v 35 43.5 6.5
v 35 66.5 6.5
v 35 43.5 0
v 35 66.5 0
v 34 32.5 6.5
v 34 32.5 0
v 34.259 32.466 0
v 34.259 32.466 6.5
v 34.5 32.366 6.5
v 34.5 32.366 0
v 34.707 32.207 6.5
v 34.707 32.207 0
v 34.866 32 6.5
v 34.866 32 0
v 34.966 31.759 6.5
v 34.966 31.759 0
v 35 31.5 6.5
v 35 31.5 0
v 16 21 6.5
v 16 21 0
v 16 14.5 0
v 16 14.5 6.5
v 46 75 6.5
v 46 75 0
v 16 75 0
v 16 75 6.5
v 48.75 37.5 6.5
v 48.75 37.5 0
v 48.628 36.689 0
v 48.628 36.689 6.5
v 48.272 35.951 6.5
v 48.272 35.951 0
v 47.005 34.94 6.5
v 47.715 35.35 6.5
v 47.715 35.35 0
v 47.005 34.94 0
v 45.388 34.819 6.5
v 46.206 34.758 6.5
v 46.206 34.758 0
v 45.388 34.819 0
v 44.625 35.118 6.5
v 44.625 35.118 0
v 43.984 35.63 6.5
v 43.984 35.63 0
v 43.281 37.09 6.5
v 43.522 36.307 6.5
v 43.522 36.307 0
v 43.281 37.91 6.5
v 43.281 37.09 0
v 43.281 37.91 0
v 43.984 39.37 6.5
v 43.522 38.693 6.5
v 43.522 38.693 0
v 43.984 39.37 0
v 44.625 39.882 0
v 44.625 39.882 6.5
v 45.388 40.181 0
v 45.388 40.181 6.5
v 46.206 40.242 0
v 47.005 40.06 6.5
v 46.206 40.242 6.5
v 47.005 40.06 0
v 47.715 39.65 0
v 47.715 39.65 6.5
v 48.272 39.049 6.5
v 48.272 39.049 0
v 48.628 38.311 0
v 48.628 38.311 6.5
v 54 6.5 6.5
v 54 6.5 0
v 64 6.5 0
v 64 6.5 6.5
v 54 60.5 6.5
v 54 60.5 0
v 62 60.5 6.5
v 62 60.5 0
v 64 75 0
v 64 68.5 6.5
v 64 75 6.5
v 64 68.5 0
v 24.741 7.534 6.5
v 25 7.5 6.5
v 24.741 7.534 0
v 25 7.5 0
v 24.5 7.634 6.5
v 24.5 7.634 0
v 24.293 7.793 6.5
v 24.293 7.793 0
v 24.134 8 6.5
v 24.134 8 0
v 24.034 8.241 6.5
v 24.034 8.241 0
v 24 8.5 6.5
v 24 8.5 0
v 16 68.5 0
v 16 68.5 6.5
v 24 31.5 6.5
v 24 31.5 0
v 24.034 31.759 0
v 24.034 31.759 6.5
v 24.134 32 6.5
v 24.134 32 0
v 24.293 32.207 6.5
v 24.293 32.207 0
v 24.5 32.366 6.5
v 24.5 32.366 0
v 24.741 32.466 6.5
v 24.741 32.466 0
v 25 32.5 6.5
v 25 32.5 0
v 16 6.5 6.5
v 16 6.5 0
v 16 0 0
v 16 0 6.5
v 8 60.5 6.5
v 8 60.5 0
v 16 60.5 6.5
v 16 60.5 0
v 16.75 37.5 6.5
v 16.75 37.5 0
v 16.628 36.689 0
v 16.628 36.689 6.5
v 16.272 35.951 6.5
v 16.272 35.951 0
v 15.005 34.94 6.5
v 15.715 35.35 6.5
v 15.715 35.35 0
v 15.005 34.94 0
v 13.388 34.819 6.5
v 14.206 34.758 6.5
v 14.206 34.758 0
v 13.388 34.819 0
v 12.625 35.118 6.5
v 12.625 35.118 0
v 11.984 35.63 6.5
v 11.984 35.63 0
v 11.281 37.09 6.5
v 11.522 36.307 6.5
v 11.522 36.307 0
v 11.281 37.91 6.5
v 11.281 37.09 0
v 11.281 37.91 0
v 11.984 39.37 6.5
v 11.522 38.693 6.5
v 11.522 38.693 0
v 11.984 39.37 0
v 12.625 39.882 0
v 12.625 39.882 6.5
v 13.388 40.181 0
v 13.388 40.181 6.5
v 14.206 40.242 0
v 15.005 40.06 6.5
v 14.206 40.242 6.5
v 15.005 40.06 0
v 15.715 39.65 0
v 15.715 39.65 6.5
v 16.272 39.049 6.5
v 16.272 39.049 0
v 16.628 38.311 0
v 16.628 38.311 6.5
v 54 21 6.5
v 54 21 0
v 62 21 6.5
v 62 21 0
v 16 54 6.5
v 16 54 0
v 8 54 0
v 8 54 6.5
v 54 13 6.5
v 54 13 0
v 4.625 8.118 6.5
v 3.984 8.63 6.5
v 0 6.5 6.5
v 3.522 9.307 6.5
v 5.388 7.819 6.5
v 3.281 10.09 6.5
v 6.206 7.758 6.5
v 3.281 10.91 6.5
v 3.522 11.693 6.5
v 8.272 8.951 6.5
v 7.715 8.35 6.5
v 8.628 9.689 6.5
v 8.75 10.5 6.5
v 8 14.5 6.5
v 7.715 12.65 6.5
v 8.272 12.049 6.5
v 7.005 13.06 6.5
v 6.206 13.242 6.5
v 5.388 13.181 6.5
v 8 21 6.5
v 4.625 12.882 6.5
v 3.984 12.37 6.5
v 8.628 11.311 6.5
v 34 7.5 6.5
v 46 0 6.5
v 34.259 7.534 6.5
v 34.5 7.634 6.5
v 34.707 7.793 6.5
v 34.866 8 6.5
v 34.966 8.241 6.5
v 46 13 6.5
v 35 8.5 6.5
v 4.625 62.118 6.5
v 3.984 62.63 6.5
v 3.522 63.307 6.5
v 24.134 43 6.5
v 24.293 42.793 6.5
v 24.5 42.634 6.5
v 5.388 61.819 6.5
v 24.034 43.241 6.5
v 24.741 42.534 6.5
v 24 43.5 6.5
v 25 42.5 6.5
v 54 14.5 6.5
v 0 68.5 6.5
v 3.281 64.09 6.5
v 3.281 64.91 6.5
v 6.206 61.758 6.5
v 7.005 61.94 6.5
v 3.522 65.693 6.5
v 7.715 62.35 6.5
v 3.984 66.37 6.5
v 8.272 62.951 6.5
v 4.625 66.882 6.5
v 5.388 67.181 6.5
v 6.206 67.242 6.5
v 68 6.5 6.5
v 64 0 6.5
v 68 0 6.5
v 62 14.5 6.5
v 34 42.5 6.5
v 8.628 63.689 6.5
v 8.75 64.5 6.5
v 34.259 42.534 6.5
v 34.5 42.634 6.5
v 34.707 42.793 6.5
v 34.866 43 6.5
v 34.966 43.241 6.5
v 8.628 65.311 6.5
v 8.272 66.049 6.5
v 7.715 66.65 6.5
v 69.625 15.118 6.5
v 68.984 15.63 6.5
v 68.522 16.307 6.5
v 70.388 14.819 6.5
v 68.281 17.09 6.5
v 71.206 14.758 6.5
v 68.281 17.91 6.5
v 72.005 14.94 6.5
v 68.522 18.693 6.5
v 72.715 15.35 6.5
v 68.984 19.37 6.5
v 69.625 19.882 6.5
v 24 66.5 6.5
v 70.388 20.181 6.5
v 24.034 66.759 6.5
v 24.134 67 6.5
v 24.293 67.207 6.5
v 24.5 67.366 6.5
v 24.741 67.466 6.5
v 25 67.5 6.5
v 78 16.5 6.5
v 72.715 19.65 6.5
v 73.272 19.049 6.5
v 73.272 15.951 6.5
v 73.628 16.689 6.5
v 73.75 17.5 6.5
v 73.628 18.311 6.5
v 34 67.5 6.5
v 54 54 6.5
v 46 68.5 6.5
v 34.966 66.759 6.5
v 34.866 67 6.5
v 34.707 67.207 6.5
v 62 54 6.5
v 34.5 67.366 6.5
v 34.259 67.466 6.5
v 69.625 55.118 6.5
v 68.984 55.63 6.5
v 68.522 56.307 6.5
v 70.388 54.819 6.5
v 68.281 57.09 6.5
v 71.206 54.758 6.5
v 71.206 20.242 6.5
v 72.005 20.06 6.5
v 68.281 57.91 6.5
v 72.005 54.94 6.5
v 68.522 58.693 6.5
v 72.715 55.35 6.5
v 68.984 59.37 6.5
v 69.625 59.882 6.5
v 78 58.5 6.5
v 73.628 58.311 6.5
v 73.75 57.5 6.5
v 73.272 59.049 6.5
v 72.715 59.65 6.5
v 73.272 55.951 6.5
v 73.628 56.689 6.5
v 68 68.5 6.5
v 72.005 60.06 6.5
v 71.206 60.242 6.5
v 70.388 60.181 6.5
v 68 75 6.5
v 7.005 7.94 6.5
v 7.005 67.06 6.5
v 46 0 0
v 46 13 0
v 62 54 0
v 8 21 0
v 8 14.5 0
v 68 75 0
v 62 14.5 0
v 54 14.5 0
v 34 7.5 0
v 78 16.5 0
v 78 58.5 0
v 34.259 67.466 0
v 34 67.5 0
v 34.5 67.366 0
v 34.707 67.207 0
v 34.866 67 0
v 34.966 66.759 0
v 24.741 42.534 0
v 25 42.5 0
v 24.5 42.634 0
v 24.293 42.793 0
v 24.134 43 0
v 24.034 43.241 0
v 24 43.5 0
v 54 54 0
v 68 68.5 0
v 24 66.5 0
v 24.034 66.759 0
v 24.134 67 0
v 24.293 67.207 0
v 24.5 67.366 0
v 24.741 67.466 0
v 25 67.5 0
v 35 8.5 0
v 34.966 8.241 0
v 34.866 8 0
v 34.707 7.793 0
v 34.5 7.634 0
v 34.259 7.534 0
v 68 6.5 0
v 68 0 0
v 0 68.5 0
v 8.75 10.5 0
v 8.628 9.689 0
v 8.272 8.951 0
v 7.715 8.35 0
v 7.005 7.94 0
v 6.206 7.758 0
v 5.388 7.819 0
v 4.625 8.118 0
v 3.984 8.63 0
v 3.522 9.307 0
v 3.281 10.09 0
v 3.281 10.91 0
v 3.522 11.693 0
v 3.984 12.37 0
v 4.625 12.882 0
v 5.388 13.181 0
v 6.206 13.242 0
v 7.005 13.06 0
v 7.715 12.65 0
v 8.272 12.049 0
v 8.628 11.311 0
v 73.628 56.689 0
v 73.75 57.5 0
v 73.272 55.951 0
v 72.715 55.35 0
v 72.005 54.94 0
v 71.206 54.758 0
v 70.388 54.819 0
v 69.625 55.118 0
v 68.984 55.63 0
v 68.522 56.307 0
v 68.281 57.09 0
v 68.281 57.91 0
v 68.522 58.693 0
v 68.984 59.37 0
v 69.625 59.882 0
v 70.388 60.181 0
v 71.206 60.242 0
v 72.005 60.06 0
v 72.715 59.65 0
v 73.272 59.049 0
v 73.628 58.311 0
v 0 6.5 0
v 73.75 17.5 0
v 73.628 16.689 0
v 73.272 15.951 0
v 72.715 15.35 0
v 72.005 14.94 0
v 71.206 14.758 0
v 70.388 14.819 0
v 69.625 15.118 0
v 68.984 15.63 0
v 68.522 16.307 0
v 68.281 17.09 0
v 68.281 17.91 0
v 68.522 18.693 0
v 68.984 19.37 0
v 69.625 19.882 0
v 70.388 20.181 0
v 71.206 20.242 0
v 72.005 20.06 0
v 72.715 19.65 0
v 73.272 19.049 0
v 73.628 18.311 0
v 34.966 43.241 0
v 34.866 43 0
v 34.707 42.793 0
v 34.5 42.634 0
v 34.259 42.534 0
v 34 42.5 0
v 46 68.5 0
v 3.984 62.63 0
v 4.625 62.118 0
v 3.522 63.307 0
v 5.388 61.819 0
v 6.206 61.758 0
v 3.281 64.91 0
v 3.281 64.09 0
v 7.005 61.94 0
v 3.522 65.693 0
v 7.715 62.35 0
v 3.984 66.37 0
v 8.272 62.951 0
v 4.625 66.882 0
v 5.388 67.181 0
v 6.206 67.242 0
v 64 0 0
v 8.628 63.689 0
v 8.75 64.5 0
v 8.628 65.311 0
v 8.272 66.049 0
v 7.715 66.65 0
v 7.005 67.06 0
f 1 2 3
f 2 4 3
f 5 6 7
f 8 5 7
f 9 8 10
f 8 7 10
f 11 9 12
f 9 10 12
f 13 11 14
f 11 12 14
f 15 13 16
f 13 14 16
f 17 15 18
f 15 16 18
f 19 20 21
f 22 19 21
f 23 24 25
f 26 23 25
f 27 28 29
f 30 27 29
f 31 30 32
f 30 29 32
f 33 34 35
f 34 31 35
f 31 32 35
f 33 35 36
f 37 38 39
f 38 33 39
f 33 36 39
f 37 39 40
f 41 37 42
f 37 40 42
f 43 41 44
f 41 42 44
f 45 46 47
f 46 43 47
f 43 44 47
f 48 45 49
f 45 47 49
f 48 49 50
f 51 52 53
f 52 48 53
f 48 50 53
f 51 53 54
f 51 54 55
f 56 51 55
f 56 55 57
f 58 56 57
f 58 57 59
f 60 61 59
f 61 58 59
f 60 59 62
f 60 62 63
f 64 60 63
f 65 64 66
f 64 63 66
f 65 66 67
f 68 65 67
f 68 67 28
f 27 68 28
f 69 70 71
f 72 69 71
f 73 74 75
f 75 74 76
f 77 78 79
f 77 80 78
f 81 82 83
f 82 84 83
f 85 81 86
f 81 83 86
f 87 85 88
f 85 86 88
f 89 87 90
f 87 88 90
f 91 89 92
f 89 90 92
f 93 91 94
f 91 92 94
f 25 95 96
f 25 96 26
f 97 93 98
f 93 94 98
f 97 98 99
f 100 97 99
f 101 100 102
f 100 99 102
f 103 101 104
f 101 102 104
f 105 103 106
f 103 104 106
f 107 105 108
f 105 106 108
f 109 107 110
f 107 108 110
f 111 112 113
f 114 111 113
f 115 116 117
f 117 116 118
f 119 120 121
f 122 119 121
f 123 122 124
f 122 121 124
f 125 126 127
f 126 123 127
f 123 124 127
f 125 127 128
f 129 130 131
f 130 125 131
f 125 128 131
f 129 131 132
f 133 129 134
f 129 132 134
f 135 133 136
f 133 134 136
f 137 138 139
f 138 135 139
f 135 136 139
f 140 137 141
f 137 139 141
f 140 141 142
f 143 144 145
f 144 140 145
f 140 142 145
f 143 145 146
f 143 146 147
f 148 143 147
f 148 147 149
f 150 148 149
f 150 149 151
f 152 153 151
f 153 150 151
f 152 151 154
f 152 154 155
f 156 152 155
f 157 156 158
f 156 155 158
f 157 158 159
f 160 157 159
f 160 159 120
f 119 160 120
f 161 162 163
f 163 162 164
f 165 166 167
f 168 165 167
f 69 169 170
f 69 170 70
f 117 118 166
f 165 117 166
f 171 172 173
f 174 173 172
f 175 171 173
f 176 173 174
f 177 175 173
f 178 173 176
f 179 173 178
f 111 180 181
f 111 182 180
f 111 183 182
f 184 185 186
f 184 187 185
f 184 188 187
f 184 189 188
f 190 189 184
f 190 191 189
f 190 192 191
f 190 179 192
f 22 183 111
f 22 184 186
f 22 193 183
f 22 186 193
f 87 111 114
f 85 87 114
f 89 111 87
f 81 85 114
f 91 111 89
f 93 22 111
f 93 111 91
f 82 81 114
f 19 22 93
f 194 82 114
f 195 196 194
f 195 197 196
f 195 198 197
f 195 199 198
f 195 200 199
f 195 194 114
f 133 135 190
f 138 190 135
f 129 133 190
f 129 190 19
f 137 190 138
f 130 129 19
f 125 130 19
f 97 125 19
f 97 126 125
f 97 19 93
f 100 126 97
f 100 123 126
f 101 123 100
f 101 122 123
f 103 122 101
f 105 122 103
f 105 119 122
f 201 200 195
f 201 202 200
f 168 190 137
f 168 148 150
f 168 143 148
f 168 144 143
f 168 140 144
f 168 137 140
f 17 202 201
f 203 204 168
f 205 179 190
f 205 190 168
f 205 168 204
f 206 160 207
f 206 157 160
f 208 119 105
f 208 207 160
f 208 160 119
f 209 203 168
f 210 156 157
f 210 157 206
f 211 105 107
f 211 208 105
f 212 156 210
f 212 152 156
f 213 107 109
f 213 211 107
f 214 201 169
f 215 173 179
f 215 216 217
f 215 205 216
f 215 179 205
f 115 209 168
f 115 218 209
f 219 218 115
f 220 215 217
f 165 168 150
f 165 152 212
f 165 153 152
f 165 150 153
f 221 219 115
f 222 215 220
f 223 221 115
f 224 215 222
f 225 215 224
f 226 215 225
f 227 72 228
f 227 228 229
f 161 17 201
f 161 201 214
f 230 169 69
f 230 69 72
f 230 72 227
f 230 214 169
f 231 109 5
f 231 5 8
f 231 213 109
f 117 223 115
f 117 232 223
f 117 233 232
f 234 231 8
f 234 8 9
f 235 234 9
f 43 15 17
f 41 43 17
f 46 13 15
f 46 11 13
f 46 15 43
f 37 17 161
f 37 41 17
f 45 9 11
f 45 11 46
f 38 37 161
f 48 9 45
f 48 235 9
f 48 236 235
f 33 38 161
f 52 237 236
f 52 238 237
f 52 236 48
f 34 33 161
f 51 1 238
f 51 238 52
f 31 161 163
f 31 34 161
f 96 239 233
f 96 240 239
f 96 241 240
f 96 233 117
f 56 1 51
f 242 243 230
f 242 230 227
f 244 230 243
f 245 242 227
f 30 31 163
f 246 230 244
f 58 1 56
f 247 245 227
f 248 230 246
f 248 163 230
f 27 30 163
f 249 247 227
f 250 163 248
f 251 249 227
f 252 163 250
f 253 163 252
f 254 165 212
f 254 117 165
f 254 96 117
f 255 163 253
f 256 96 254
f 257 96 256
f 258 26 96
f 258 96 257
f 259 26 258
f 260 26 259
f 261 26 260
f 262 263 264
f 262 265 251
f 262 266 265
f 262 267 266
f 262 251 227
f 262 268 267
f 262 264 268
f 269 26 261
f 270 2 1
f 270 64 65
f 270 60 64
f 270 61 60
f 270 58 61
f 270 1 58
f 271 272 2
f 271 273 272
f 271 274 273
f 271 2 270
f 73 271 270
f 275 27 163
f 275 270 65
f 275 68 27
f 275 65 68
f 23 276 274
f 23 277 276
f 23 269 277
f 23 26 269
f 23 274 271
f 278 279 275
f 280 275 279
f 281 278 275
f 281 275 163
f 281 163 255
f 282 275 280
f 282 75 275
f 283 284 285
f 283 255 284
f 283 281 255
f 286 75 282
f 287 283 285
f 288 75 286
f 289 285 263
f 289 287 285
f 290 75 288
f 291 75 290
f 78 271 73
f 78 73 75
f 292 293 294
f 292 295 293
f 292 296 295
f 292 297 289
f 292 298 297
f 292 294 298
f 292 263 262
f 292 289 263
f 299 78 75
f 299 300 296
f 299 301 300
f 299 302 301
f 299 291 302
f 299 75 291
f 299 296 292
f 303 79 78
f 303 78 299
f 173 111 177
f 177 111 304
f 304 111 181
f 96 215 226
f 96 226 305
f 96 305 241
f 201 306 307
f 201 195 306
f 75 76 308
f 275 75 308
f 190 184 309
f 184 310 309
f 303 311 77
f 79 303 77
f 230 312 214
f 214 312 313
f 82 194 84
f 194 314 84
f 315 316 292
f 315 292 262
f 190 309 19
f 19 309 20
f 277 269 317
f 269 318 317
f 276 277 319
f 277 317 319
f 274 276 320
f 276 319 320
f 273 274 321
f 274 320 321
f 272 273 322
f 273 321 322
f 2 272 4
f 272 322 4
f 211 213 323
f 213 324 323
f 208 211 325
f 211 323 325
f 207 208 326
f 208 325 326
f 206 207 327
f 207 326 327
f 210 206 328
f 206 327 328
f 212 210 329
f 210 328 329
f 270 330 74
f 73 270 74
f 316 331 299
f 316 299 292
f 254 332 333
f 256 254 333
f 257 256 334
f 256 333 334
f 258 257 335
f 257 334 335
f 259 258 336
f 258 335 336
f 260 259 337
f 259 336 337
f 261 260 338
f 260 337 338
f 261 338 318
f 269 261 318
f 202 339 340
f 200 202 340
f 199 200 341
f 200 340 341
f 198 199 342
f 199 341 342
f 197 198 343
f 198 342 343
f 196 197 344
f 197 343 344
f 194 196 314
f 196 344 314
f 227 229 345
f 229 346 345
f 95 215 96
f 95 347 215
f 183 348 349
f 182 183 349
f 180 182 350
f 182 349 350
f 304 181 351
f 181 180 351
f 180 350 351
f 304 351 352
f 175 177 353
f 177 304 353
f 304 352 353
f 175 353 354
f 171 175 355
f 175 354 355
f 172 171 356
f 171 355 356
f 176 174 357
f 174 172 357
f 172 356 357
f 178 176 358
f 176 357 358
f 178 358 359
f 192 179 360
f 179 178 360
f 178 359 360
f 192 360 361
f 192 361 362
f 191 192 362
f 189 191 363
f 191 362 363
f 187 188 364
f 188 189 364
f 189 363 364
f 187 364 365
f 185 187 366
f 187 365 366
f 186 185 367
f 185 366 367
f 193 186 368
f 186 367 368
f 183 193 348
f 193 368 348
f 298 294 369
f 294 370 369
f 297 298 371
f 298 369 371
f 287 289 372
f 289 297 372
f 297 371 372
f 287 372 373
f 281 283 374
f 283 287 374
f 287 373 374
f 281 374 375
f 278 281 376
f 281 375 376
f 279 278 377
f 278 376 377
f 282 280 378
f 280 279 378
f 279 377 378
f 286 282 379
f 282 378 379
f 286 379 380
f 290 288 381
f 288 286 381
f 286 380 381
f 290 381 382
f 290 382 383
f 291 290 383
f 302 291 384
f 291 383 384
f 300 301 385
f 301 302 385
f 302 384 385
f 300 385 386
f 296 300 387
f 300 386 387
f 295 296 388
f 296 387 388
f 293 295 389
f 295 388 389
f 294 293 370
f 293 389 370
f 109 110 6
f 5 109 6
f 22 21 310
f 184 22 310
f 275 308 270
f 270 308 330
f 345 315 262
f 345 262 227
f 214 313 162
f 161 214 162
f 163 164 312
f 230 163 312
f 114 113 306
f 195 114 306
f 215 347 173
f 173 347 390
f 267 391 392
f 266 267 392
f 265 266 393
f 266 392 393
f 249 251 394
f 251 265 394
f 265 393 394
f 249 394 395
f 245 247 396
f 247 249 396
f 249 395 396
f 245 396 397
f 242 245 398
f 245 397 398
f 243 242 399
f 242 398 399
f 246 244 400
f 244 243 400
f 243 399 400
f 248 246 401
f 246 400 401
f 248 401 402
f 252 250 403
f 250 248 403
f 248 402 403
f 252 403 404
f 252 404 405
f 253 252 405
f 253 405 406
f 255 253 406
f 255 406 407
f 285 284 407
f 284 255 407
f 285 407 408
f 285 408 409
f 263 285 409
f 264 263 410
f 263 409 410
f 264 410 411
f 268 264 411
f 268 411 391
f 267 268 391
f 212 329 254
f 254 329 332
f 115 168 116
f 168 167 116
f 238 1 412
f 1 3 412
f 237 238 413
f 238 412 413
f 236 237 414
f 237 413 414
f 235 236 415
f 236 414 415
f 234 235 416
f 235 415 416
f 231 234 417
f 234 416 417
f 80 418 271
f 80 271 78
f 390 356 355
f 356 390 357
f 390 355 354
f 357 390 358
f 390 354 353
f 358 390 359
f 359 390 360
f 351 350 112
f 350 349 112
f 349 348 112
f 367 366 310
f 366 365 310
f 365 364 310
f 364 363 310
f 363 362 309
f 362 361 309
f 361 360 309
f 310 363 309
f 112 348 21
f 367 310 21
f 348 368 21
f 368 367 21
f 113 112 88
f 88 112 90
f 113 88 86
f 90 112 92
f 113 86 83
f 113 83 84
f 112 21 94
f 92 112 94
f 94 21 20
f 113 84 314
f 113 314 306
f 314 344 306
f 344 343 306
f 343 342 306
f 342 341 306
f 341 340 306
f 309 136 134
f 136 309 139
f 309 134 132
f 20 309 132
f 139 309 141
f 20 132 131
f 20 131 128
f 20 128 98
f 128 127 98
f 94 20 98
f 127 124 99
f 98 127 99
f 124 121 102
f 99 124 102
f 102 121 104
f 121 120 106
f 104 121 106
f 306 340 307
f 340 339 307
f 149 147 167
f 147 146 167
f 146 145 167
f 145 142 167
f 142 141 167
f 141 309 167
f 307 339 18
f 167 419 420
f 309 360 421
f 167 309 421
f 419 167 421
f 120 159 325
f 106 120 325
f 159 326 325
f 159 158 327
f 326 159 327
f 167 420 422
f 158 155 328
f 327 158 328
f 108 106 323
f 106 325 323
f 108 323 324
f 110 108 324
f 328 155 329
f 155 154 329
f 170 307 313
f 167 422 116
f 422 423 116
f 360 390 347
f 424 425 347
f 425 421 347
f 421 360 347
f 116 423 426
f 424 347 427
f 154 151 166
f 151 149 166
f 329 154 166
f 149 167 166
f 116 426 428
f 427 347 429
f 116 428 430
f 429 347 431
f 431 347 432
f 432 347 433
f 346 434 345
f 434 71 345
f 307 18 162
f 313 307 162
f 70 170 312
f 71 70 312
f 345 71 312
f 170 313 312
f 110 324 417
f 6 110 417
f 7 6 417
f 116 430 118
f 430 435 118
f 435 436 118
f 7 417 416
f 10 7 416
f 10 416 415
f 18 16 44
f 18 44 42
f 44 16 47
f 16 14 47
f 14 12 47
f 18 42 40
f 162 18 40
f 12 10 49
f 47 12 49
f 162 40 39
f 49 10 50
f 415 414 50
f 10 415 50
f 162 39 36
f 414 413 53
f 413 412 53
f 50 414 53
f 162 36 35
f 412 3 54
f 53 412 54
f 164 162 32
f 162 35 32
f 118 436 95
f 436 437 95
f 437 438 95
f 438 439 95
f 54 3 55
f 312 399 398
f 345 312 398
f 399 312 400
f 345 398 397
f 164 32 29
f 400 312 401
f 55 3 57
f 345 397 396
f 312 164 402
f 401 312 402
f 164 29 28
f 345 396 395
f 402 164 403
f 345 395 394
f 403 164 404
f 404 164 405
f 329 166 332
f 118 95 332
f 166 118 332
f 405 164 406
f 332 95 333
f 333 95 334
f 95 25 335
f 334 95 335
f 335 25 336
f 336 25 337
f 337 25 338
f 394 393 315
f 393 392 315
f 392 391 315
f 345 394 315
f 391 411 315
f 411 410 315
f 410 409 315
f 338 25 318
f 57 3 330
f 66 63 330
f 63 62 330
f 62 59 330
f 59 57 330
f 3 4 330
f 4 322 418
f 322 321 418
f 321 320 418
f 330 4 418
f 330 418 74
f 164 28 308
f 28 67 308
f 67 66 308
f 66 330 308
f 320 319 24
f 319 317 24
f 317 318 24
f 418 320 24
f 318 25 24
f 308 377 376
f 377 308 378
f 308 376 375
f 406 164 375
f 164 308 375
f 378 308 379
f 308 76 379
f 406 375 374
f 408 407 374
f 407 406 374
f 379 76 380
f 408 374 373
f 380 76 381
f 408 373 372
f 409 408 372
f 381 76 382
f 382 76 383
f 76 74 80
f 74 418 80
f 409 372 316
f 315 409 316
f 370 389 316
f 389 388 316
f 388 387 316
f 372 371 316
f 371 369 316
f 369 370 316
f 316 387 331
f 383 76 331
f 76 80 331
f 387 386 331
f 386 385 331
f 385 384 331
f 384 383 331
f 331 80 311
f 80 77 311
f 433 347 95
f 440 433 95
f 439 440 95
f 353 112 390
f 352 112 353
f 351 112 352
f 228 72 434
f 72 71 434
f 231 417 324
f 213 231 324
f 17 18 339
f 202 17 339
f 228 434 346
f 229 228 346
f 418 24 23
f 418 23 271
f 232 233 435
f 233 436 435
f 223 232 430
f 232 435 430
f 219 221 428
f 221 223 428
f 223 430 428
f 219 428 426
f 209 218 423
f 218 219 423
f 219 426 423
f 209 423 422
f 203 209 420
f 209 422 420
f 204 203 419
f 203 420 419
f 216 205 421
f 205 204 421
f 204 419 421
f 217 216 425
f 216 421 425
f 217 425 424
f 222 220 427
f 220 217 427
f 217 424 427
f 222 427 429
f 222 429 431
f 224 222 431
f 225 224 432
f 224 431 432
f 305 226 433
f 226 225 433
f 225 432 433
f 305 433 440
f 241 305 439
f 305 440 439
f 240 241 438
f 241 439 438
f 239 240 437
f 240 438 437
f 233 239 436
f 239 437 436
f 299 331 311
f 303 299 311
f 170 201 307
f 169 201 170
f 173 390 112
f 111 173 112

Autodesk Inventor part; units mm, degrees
ref_plane "YZ Plane" through (0, 0, 0) normal (1, 0, 0) x (0, 1, 0)
ref_plane "XZ Plane" through (0, 0, 0) normal (0, 1, 0) x (-1, 0, 0)
ref_plane "XY Plane" through (0, 0, 0) normal (0, 0, 1) x (1, 0, 0)
sketch "Sketch1" plane through (0, 0, 0) normal (0, 0, 1) x (1, 0, 0)
  line L0 (0, 68.5) -> (0, 6.5)
  line L1 (68, 68.5) -> (78, 58.5)
  line L2 (78, 58.5) -> (78, 16.5)
  line L3 (78, 16.5) -> (68, 6.5)
  line L4 (68, 0) -> (68, 6.5)
  line L5 (68, 68.5) -> (68, 75)
  circle A0 centre (71, 57.5) radius 2.75
  circle A1 centre (71, 17.5) radius 2.75
  line L6 (25, 67.5) -> (34, 67.5)
  line L7 (35, 66.5) -> (35, 43.5)
  line L8 (34, 42.5) -> (25, 42.5)
  line L9 (24, 43.5) -> (24, 66.5)
  line L10 (25, 32.5) -> (34, 32.5)
  line L11 (35, 31.5) -> (35, 8.5)
  line L12 (34, 7.5) -> (25, 7.5)
  line L13 (24, 8.5) -> (24, 31.5)
  arc A2 (25, 67.5) -> (24, 66.5) centre (25, 66.5) ccw
  arc A3 (35, 66.5) -> (34, 67.5) centre (34, 66.5) ccw
  arc A4 (34, 42.5) -> (35, 43.5) centre (34, 43.5) ccw
  arc A5 (24, 43.5) -> (25, 42.5) centre (25, 43.5) ccw
  arc A6 (25, 32.5) -> (24, 31.5) centre (25, 31.5) ccw
  arc A7 (24, 8.5) -> (25, 7.5) centre (25, 8.5) ccw
  arc A8 (34, 7.5) -> (35, 8.5) centre (34, 8.5) ccw
  arc A9 (35, 31.5) -> (34, 32.5) centre (34, 31.5) ccw
  line L14 (29.5, 67.5) -> (29.5, 7.5) construction
  circle A10 centre (6, 64.5) radius 5 construction
  circle A11 centre (6, 64.5) radius 2.75
  circle A12 centre (6, 10.5) radius 5 construction
  circle A13 centre (6, 10.5) radius 2.75
  line L15 (0, 64.5) -> (72, 64.5) construction
  line L16 (0, 10.5) -> (72, 10.5) construction
  line L17 (0, 6.5) -> (16, 6.5)
  line L18 (16, 6.5) -> (16, 0)
  line L19 (0, 68.5) -> (16, 68.5)
  line L20 (16, 68.5) -> (16, 75)
  line L21 (46, 75) -> (46, 68.5)
  line L22 (46, 68.5) -> (64, 68.5)
  line L23 (64, 68.5) -> (64, 75)
  line L24 (46, 0) -> (46, 6.5)
  line L25 (46, 6.5) -> (64, 6.5)
  line L26 (64, 6.5) -> (64, 0)
  line L27 (68, 75) -> (64, 75)
  line L28 (46, 75) -> (16, 75)
  line L29 (16, 0) -> (46, 0)
  line L30 (64, 0) -> (68, 0)
  line L31 (8, 60.5) -> (16, 60.5)
  line L32 (16, 60.5) -> (16, 54)
  line L33 (16, 54) -> (8, 54)
  line L34 (8, 54) -> (8, 60.5)
  line L35 (8, 21) -> (16, 21)
  line L36 (16, 21) -> (16, 14.5)
  line L37 (16, 14.5) -> (8, 14.5)
  line L38 (8, 14.5) -> (8, 21)
  line L39 (54, 21) -> (62, 21)
  line L40 (62, 21) -> (62, 14.5)
  line L41 (62, 14.5) -> (54, 14.5)
  line L42 (54, 14.5) -> (54, 21)
  line L43 (54, 60.5) -> (62, 60.5)
  line L44 (62, 60.5) -> (62, 54)
  line L45 (62, 54) -> (54, 54)
  line L46 (54, 54) -> (54, 60.5)
  circle A14 centre (14, 37.5) radius 5 construction
  circle A15 centre (46, 37.5) radius 5 construction
  circle A16 centre (46, 37.5) radius 2.75
  circle A17 centre (14, 37.5) radius 2.75
  point P0 (0, 0)
  point P1 (29.5, 37.5)
  point P2 (0, 37.5)
  dimension "d1" = 45
  dimension "d2" = 10
  dimension "d11" = 5.5
  dimension "d12" = 5.5
  dimension "d13" = 7
  dimension "d14" = 11
  dimension "d15" = 11
  dimension "d18" = 1
  dimension "d19" = 11
  dimension "d20" = 25
  dimension "d21" = 25
  dimension "d24" = 38.5
  dimension "d25" = 5.5
  dimension "d26" = 5.5
  dimension "d27" = 10
  dimension "d28" = 10
  dimension "d32" = 6
  dimension "d34" = 68
  dimension "d35" = 6.5
  dimension "d36" = 6.5
  dimension "d37" = 4
  dimension "d38" = 4
  dimension "d40" = 1
  dimension "d41" = 30
  dimension "d42" = 18
  dimension "d43" = 4
  dimension "d44" = 4
  dimension "d45" = 6.5
  dimension "d46" = 6.5
  dimension "d47" = 8
  dimension "d48" = 8
  dimension "d49" = 4
  dimension "d50" = 4
  dimension "d51" = 8
  dimension "d52" = 6
  dimension "d53" = 10
  dimension "d54" = 5.5
  dimension "d55" = 10
  dimension "d56" = 5.5
  dimension "d57" = 14
  dimension "d58" = 32
  dimension "d67" = 54
extrude "Extrusion1" add sketch "Sketch1" along normal blind 6.5
sketch "Sketch2" plane through (0, 0, 6.5) normal (0, 0, 1) x (1, 0, 0)
  line L0 (46, 6.5) -> (64, 6.5) projected
  line L1 (46, 13) -> (54, 13)
  line L2 (54, 13) -> (54, 6.5)
  line L3 (54, 6.5) -> (46, 6.5)
  line L4 (46, 6.5) -> (46, 13)
  line L5 (46, 0) -> (46, 6.5) projected
  point P0 (0, 0)
  dimension "d61" = 6.5
  dimension "d62" = 8
extrude "Extrusion2" cut sketch "Sketch2" against normal through all
properties part number "x_motor_middle" material "Plywood, Finish"
